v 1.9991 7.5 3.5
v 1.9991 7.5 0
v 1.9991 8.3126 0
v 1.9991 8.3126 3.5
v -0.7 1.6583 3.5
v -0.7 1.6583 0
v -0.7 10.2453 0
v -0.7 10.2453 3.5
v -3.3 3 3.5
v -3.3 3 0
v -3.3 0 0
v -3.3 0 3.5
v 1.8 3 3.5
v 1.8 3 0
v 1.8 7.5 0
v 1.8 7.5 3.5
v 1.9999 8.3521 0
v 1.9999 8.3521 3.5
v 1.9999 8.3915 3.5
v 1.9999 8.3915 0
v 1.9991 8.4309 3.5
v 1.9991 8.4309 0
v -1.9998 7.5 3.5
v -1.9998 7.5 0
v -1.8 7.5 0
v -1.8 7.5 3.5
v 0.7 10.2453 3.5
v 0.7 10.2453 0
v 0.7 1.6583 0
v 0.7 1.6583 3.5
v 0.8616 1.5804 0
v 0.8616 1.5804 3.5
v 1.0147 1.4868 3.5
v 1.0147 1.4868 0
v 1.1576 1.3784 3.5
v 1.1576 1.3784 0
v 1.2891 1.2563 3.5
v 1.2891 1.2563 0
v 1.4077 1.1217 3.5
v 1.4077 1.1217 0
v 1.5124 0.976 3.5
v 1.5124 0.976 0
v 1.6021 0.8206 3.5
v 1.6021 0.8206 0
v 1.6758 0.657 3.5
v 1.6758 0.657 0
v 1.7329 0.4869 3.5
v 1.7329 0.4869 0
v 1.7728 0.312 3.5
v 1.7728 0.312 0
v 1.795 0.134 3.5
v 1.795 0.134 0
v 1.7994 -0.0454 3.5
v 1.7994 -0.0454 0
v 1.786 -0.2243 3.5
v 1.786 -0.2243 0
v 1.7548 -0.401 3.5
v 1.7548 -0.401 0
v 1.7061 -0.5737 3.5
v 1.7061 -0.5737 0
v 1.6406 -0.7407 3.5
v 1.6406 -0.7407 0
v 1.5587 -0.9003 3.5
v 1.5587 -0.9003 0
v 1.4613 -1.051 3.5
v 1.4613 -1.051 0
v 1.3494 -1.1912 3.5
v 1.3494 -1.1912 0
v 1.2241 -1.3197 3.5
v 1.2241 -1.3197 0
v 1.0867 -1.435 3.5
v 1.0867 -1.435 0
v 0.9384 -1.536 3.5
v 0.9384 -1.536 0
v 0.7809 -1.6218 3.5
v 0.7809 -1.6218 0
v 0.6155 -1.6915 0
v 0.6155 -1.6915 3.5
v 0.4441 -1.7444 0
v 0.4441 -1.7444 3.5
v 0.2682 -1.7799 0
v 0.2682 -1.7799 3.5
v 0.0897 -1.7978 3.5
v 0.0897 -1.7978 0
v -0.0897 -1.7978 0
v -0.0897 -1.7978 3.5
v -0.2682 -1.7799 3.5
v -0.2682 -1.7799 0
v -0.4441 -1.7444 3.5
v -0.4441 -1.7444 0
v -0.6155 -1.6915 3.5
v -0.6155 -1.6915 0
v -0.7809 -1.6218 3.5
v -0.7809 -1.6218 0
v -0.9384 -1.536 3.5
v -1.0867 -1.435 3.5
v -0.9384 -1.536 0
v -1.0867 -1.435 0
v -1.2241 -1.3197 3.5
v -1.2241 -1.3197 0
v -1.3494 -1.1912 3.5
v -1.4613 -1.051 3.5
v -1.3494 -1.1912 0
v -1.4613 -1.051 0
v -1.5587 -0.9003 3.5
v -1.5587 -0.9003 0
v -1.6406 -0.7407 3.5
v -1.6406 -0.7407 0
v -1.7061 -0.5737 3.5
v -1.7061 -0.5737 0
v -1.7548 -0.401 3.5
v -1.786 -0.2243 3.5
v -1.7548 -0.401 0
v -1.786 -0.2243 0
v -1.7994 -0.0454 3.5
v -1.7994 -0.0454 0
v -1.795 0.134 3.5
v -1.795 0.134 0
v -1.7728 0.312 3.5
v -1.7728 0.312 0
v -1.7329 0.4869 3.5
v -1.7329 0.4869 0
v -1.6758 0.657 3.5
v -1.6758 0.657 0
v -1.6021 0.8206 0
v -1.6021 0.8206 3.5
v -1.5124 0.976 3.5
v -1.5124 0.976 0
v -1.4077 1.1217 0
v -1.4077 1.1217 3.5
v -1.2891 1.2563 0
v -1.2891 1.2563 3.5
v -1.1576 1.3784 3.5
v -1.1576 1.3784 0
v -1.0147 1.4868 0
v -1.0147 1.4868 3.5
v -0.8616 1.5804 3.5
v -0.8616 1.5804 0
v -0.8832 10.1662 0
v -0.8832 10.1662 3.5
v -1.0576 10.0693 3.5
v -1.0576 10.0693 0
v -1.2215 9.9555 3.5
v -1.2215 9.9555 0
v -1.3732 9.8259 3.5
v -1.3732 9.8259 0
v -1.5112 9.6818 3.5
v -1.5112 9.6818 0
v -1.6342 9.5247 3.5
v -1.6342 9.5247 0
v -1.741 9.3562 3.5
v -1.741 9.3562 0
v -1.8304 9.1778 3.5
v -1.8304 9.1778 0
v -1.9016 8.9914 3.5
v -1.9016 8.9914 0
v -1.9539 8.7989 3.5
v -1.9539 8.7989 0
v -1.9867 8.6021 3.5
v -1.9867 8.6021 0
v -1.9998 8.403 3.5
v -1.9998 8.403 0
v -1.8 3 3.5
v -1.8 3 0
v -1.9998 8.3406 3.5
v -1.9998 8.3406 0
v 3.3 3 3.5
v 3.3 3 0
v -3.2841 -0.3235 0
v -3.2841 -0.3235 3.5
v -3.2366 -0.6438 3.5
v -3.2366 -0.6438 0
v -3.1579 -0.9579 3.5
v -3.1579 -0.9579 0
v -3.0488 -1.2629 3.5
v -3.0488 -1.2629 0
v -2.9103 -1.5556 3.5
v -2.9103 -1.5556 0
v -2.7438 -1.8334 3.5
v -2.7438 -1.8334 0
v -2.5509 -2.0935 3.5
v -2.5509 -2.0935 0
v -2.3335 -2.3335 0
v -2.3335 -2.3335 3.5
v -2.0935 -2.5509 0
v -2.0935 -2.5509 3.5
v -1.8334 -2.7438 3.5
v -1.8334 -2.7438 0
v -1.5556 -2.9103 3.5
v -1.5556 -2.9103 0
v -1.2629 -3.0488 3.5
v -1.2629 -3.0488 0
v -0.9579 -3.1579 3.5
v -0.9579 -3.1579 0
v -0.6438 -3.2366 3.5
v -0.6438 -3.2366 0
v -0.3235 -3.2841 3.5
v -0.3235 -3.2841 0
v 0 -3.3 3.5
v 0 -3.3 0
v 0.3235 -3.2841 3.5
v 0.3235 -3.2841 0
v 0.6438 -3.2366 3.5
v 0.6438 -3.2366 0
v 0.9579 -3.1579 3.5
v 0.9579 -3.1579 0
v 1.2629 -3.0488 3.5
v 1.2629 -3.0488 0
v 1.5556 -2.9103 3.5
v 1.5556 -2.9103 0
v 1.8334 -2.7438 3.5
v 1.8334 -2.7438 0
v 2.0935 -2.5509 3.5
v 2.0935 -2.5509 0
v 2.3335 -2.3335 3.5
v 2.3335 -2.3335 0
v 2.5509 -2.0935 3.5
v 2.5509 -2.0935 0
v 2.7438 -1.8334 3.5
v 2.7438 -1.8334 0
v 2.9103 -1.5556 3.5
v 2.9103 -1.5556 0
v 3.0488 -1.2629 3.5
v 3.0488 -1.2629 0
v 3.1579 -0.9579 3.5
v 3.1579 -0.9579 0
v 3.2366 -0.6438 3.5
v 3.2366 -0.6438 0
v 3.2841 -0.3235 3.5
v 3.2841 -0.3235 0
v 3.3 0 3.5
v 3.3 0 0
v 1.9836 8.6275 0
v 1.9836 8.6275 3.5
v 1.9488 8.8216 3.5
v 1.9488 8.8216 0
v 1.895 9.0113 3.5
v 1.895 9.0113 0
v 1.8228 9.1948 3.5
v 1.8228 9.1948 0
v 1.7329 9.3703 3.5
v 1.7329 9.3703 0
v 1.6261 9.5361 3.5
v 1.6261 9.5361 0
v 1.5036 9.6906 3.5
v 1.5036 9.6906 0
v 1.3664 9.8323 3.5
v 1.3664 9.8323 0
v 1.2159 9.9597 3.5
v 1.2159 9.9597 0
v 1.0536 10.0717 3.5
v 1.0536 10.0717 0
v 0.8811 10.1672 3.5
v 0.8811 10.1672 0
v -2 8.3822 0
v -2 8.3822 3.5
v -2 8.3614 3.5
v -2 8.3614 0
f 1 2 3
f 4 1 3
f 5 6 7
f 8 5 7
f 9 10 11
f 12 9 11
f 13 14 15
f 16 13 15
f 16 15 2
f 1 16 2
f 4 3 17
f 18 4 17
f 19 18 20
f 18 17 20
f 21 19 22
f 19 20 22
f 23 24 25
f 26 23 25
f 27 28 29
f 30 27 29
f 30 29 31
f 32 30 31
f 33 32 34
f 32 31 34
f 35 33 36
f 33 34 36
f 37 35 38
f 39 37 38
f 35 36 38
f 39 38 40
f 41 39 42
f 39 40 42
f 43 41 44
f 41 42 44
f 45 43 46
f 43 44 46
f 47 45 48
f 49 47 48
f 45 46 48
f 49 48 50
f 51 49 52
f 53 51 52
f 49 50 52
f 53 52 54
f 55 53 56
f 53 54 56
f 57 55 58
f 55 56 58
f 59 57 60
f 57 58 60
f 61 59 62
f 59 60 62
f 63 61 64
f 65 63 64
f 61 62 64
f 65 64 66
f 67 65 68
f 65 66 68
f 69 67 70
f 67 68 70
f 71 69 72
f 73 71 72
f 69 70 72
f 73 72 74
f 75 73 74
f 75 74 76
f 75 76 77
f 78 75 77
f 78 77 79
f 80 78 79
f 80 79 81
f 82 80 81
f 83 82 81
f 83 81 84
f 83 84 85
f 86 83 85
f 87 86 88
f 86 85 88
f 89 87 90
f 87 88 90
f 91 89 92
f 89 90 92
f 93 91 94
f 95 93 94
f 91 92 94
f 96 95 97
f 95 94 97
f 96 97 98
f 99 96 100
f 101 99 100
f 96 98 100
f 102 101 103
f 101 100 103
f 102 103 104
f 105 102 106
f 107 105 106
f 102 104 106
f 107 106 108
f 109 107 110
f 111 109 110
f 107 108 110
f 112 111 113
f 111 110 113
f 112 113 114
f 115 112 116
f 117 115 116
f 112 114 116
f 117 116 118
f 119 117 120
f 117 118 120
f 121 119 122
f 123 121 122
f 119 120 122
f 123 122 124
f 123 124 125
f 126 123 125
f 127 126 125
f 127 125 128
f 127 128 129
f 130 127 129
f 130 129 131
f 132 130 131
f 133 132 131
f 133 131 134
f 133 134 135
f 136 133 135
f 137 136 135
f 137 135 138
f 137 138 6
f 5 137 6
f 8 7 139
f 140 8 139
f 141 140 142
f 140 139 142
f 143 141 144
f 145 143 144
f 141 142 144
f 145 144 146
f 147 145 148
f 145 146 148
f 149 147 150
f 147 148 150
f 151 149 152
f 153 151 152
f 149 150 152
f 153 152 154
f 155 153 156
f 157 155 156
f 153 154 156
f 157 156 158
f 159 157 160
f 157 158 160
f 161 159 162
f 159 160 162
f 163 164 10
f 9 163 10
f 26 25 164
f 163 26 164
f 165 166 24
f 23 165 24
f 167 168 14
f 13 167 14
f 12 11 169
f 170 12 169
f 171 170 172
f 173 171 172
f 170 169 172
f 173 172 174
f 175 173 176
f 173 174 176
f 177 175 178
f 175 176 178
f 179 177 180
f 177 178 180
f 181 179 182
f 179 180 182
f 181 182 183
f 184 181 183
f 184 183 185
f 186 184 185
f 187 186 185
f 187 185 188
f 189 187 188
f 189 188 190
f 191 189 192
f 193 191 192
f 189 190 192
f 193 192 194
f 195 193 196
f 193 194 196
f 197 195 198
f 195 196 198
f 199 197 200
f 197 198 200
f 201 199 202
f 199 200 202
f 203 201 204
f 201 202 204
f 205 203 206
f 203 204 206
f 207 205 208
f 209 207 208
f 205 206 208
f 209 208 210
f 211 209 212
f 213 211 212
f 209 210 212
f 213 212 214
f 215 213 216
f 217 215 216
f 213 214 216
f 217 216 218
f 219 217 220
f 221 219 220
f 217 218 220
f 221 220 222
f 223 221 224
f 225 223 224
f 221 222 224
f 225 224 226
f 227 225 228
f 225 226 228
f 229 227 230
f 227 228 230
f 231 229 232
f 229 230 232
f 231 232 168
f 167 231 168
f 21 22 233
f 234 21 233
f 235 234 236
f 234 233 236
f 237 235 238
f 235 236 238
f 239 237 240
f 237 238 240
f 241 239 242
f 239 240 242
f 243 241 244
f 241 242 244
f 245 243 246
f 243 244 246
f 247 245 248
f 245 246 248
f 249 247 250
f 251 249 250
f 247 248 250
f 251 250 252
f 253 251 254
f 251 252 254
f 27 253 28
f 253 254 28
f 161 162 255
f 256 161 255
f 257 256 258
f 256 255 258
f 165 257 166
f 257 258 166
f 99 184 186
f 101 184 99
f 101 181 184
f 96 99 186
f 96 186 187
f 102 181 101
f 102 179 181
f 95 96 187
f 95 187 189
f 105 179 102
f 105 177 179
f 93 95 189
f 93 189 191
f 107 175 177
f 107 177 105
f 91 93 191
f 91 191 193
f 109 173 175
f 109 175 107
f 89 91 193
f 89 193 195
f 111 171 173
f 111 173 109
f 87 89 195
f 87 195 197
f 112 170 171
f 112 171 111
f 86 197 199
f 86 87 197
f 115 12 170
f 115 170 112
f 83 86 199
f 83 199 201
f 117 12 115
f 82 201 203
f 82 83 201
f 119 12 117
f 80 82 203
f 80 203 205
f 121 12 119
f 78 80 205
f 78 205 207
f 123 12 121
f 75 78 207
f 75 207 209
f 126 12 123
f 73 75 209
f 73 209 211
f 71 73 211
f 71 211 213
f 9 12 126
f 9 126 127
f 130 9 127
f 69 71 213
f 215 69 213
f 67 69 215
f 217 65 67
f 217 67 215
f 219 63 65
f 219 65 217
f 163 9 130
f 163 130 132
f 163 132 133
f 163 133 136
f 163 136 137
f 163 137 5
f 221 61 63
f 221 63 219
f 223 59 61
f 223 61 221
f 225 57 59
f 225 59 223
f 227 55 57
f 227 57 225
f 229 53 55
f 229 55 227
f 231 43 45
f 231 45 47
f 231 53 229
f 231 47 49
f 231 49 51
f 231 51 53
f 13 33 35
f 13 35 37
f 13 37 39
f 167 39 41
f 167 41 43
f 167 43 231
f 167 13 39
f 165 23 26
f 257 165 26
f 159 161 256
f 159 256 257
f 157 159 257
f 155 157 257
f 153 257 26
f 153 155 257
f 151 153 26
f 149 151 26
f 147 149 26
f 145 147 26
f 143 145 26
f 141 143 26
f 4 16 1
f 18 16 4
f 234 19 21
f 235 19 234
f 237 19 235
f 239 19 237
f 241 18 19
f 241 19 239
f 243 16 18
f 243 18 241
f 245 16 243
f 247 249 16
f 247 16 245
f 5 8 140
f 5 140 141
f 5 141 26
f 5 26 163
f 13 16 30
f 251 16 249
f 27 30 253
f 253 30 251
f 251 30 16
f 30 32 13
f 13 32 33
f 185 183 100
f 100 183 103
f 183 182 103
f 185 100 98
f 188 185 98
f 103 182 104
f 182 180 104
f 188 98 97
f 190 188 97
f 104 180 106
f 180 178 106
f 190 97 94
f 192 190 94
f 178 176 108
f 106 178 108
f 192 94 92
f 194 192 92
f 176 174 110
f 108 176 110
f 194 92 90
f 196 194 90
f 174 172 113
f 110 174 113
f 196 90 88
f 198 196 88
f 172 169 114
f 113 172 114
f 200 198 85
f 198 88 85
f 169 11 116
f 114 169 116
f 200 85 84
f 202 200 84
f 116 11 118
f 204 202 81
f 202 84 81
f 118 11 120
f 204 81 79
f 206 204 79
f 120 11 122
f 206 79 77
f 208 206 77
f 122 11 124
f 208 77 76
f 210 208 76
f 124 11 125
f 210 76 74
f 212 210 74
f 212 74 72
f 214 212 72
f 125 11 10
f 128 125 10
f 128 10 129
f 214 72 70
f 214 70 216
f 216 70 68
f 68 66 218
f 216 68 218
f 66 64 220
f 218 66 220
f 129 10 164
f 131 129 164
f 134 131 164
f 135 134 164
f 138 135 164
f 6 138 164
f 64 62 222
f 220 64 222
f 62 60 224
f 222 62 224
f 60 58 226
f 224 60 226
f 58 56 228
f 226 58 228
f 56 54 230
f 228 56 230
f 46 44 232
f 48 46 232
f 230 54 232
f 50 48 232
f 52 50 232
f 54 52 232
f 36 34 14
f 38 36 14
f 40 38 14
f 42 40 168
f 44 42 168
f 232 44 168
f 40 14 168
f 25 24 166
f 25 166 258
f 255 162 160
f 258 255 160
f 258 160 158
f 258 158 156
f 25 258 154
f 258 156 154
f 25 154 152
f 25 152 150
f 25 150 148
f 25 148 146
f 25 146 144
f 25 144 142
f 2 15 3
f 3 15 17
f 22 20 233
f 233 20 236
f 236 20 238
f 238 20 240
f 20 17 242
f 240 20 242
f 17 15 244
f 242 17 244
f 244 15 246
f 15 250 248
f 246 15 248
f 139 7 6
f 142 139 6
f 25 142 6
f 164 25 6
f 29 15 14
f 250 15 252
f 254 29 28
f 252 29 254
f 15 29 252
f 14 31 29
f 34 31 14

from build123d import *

# Parameters (mm, degrees)
F1_DEPTH = 3.5


with BuildPart() as f1:
    # F0 (on Top) → F1 (new body)
    with BuildSketch(Plane.XY):
        with BuildLine():
            ThreePointArc((0.7, 1.658312), (0, -1.8), (-0.7, 1.658312))
            Line((-0.7, 1.658312), (-0.7, 10.245279))
            ThreePointArc((-0.7, 10.245279), (-1.63423, 9.524729), (-1.999757, 8.402958))
            Line((-1.999757, 8.402958), (-1.999757, 8.340602))
            Line((-1.999757, 8.340602), (-1.999757, 7.5))
            Line((-1.999757, 7.5), (-1.8, 7.5))
            Line((-1.8, 7.5), (-1.8, 3))
            Line((-1.8, 3), (-3.3, 3))
            Line((-3.3, 3), (-3.3, 0))
            ThreePointArc((-3.3, 0), (0, -3.3), (3.3, 0))
            Line((3.3, 0), (3.3, 3))
            Line((3.3, 3), (1.8, 3))
            Line((1.8, 3), (1.8, 7.5))
            Line((1.8, 7.5), (1.999125, 7.5))
            Line((1.999125, 7.5), (1.999125, 8.312613))
            Line((1.999125, 8.312613), (1.999125, 8.430947))
            ThreePointArc((1.999125, 8.430947), (1.626121, 9.536138), (0.7, 10.245279))
            Line((0.7, 10.245279), (0.7, 1.658312))
        make_face()
        with BuildLine():
            Line((-1.999757, 8.340602), (-1.999757, 8.402958))
            ThreePointArc((-1.999757, 8.402958), (-2, 8.37178), (-1.999757, 8.340602))
        make_face()
        with BuildLine():
            ThreePointArc((1.999125, 8.312613), (2, 8.37178), (1.999125, 8.430947))
            Line((1.999125, 8.430947), (1.999125, 8.312613))
        make_face()
    extrude(amount=F1_DEPTH)


solid = f1.part
